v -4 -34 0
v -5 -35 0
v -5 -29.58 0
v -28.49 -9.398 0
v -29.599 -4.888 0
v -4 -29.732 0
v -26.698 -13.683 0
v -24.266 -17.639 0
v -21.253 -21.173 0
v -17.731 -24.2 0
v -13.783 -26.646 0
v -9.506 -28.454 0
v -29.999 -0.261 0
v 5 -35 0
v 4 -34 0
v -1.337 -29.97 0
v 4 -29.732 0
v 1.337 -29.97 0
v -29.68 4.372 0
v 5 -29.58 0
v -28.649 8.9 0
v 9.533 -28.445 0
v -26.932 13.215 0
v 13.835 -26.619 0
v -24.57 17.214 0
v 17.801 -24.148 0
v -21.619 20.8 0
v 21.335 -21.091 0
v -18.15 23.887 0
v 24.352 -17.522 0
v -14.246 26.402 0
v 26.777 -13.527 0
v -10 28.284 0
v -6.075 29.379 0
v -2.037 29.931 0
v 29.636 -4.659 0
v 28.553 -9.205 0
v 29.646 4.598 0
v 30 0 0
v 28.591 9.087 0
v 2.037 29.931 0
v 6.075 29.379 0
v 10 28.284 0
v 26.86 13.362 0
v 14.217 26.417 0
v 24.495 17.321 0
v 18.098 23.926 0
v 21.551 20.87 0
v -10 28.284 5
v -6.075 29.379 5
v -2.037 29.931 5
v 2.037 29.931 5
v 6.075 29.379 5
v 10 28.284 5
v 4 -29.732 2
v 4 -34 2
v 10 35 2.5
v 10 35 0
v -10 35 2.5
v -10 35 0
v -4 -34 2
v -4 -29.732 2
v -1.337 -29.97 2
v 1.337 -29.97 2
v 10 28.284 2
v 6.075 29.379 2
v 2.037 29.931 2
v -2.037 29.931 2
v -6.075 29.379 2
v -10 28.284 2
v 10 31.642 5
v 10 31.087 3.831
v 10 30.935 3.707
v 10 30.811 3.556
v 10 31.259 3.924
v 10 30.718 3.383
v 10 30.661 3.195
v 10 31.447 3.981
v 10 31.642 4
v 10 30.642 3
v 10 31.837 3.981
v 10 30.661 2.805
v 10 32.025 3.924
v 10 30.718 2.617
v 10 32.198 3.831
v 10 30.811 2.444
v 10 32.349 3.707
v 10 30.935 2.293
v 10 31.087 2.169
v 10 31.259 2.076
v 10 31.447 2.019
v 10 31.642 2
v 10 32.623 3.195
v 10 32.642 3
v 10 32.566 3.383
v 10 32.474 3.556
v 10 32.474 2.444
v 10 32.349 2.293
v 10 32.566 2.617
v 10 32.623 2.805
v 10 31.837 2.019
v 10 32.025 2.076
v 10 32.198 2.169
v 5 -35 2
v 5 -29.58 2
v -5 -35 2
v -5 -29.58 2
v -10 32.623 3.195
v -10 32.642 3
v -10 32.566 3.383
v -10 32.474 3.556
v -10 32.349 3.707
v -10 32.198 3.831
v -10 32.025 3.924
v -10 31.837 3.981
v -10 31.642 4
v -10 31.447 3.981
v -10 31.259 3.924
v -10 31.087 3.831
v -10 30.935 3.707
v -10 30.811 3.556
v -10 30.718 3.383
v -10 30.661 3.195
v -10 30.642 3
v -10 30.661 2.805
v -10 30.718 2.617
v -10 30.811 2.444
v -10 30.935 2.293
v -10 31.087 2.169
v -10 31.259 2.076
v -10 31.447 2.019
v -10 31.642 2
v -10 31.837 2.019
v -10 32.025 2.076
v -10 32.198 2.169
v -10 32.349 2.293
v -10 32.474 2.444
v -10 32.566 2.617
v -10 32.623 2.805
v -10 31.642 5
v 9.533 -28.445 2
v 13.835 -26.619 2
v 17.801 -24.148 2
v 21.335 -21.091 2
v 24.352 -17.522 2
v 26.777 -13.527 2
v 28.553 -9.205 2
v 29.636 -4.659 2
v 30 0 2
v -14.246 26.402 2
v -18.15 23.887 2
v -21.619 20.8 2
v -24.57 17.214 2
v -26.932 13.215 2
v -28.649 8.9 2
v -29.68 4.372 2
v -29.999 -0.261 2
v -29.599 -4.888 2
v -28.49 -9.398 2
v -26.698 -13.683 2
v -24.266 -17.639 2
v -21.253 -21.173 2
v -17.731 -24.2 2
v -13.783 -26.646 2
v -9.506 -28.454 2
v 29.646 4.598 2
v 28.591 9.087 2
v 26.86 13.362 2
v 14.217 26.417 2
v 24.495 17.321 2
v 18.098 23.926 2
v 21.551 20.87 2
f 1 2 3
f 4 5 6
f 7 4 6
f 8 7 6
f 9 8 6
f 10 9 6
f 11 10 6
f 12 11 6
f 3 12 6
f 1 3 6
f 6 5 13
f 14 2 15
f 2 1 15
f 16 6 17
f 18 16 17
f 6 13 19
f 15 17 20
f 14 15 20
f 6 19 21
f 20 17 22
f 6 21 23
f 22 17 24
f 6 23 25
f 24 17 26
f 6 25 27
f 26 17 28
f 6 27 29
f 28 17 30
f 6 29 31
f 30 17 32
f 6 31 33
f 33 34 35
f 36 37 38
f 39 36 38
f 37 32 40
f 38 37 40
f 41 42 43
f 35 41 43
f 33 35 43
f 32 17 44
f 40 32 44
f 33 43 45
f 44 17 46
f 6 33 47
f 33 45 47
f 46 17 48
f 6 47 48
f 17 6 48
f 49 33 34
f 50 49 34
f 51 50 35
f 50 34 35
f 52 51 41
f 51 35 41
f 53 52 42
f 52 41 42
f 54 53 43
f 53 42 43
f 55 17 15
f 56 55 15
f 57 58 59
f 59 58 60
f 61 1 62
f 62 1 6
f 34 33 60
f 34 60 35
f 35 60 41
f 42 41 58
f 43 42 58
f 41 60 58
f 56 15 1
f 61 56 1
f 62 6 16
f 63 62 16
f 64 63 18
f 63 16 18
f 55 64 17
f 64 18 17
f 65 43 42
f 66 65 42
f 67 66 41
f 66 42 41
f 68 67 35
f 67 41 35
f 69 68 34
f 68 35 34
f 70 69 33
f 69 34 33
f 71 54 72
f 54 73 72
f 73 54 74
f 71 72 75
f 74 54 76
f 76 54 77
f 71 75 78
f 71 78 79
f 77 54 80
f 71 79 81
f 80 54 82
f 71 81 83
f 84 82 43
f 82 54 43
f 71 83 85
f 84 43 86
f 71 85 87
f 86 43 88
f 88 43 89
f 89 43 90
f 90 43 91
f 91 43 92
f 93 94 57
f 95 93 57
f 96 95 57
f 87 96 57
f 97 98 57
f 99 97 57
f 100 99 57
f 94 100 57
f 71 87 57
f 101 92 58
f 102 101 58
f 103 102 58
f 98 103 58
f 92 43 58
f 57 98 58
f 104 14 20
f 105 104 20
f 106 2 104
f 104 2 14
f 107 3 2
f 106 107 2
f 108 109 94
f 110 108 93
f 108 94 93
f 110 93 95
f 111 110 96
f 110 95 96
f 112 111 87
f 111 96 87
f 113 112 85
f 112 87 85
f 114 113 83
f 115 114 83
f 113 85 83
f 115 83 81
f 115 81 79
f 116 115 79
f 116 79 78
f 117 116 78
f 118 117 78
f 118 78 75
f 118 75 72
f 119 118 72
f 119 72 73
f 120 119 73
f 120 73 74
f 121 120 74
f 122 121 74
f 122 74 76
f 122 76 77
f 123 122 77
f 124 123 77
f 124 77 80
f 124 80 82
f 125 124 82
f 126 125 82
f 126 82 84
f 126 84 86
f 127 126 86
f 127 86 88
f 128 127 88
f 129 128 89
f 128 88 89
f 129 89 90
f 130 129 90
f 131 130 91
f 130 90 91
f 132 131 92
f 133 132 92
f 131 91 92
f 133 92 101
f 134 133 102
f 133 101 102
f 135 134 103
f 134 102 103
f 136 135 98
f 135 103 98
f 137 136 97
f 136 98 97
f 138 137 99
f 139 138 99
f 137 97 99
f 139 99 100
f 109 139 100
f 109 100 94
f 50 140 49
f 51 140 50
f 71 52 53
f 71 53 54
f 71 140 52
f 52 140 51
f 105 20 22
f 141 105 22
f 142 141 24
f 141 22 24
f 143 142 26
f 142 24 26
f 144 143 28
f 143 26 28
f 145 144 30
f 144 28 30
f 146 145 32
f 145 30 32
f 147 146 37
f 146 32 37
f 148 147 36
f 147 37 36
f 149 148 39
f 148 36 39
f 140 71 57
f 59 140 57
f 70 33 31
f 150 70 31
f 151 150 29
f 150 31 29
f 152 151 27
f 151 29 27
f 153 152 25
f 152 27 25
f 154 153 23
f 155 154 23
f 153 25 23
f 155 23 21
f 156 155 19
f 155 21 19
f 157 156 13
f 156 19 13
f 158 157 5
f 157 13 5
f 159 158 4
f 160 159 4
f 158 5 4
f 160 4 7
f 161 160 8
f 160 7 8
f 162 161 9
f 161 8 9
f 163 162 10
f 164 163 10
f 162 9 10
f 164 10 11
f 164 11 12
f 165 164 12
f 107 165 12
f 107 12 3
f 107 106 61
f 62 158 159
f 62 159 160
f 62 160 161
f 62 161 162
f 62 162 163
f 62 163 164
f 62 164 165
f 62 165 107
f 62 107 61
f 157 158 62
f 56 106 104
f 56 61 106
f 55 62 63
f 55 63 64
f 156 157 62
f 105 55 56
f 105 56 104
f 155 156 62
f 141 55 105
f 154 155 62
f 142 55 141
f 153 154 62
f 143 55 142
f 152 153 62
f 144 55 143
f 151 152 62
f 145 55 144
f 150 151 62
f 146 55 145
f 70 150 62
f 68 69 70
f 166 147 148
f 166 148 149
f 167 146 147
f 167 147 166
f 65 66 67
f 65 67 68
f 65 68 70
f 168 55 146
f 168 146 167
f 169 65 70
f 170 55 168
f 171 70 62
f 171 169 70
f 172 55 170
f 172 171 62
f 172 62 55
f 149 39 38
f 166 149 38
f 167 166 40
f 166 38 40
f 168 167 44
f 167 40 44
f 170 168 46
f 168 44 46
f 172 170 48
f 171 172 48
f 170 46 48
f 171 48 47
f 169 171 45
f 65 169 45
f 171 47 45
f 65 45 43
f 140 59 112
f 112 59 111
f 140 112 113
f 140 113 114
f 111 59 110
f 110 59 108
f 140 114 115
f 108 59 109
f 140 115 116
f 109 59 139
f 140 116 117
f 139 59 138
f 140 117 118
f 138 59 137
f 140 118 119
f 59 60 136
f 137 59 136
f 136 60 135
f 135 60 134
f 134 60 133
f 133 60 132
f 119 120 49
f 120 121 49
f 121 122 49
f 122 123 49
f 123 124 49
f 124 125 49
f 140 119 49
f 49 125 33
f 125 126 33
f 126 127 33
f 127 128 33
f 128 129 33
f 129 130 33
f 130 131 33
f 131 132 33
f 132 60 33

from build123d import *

# Parameters (mm, degrees)
F1_DEPTH = 2
F2_DEPTH = 5
F3_R     = 1
F4_DEPTH = 40.001


with BuildPart() as f1:
    # F0 (on Top) → F1 (new body)
    with BuildSketch(Plane.XY):
        with BuildLine():
            ThreePointArc((5, -29.580399), (22.912878, -19.364917), (30, 0))
            ThreePointArc((30, 0), (24.494897, 17.320508), (10, 28.284271))
            ThreePointArc((10, 28.284271), (0, 30), (-10, 28.284271))
            ThreePointArc((-10, 28.284271), (-29.888627, -2.582632), (-5, -29.580399))
            ThreePointArc((-5, -29.580399), (-4.50064, -29.660483), (-4, -29.732137))
            ThreePointArc((-4, -29.732137), (0, -30), (4, -29.732137))
            ThreePointArc((4, -29.732137), (4.50064, -29.660483), (5, -29.580399))
        make_face()
        with BuildLine():
            Line((5, -35), (5, -29.580399))
            ThreePointArc((5, -29.580399), (4.50064, -29.660483), (4, -29.732137))
            Line((4, -29.732137), (4, -34))
            Line((4, -34), (-4, -34))
            Line((-4, -34), (-4, -29.732137))
            ThreePointArc((-4, -29.732137), (-4.50064, -29.660483), (-5, -29.580399))
            Line((-5, -29.580399), (-5, -35))
            Line((-5, -35), (5, -35))
        make_face()
    extrude(amount=F1_DEPTH)


with BuildPart() as f2:
    # F0 (on Top) → F2 (new body)
    with BuildSketch(Plane.XY):
        with BuildLine():
            ThreePointArc((-10, 28.284271), (0, 30), (10, 28.284271))
            Line((10, 28.284271), (10, 35))
            Line((10, 35), (-10, 35))
            Line((-10, 35), (-10, 28.284271))
        make_face()
    extrude(amount=F2_DEPTH)

    # F3 (on face) → F4 (cut, through all)
    with BuildSketch(Plane.YZ.offset(10)):
        Polygon((31.642136, 5), (35, 2.5), (35, 5), align=None)
        with Locations((31.642136, 3)):
            Circle(F3_R)
    extrude(amount=-F4_DEPTH, mode=Mode.SUBTRACT)


solid = Compound([f1.part, f2.part])
